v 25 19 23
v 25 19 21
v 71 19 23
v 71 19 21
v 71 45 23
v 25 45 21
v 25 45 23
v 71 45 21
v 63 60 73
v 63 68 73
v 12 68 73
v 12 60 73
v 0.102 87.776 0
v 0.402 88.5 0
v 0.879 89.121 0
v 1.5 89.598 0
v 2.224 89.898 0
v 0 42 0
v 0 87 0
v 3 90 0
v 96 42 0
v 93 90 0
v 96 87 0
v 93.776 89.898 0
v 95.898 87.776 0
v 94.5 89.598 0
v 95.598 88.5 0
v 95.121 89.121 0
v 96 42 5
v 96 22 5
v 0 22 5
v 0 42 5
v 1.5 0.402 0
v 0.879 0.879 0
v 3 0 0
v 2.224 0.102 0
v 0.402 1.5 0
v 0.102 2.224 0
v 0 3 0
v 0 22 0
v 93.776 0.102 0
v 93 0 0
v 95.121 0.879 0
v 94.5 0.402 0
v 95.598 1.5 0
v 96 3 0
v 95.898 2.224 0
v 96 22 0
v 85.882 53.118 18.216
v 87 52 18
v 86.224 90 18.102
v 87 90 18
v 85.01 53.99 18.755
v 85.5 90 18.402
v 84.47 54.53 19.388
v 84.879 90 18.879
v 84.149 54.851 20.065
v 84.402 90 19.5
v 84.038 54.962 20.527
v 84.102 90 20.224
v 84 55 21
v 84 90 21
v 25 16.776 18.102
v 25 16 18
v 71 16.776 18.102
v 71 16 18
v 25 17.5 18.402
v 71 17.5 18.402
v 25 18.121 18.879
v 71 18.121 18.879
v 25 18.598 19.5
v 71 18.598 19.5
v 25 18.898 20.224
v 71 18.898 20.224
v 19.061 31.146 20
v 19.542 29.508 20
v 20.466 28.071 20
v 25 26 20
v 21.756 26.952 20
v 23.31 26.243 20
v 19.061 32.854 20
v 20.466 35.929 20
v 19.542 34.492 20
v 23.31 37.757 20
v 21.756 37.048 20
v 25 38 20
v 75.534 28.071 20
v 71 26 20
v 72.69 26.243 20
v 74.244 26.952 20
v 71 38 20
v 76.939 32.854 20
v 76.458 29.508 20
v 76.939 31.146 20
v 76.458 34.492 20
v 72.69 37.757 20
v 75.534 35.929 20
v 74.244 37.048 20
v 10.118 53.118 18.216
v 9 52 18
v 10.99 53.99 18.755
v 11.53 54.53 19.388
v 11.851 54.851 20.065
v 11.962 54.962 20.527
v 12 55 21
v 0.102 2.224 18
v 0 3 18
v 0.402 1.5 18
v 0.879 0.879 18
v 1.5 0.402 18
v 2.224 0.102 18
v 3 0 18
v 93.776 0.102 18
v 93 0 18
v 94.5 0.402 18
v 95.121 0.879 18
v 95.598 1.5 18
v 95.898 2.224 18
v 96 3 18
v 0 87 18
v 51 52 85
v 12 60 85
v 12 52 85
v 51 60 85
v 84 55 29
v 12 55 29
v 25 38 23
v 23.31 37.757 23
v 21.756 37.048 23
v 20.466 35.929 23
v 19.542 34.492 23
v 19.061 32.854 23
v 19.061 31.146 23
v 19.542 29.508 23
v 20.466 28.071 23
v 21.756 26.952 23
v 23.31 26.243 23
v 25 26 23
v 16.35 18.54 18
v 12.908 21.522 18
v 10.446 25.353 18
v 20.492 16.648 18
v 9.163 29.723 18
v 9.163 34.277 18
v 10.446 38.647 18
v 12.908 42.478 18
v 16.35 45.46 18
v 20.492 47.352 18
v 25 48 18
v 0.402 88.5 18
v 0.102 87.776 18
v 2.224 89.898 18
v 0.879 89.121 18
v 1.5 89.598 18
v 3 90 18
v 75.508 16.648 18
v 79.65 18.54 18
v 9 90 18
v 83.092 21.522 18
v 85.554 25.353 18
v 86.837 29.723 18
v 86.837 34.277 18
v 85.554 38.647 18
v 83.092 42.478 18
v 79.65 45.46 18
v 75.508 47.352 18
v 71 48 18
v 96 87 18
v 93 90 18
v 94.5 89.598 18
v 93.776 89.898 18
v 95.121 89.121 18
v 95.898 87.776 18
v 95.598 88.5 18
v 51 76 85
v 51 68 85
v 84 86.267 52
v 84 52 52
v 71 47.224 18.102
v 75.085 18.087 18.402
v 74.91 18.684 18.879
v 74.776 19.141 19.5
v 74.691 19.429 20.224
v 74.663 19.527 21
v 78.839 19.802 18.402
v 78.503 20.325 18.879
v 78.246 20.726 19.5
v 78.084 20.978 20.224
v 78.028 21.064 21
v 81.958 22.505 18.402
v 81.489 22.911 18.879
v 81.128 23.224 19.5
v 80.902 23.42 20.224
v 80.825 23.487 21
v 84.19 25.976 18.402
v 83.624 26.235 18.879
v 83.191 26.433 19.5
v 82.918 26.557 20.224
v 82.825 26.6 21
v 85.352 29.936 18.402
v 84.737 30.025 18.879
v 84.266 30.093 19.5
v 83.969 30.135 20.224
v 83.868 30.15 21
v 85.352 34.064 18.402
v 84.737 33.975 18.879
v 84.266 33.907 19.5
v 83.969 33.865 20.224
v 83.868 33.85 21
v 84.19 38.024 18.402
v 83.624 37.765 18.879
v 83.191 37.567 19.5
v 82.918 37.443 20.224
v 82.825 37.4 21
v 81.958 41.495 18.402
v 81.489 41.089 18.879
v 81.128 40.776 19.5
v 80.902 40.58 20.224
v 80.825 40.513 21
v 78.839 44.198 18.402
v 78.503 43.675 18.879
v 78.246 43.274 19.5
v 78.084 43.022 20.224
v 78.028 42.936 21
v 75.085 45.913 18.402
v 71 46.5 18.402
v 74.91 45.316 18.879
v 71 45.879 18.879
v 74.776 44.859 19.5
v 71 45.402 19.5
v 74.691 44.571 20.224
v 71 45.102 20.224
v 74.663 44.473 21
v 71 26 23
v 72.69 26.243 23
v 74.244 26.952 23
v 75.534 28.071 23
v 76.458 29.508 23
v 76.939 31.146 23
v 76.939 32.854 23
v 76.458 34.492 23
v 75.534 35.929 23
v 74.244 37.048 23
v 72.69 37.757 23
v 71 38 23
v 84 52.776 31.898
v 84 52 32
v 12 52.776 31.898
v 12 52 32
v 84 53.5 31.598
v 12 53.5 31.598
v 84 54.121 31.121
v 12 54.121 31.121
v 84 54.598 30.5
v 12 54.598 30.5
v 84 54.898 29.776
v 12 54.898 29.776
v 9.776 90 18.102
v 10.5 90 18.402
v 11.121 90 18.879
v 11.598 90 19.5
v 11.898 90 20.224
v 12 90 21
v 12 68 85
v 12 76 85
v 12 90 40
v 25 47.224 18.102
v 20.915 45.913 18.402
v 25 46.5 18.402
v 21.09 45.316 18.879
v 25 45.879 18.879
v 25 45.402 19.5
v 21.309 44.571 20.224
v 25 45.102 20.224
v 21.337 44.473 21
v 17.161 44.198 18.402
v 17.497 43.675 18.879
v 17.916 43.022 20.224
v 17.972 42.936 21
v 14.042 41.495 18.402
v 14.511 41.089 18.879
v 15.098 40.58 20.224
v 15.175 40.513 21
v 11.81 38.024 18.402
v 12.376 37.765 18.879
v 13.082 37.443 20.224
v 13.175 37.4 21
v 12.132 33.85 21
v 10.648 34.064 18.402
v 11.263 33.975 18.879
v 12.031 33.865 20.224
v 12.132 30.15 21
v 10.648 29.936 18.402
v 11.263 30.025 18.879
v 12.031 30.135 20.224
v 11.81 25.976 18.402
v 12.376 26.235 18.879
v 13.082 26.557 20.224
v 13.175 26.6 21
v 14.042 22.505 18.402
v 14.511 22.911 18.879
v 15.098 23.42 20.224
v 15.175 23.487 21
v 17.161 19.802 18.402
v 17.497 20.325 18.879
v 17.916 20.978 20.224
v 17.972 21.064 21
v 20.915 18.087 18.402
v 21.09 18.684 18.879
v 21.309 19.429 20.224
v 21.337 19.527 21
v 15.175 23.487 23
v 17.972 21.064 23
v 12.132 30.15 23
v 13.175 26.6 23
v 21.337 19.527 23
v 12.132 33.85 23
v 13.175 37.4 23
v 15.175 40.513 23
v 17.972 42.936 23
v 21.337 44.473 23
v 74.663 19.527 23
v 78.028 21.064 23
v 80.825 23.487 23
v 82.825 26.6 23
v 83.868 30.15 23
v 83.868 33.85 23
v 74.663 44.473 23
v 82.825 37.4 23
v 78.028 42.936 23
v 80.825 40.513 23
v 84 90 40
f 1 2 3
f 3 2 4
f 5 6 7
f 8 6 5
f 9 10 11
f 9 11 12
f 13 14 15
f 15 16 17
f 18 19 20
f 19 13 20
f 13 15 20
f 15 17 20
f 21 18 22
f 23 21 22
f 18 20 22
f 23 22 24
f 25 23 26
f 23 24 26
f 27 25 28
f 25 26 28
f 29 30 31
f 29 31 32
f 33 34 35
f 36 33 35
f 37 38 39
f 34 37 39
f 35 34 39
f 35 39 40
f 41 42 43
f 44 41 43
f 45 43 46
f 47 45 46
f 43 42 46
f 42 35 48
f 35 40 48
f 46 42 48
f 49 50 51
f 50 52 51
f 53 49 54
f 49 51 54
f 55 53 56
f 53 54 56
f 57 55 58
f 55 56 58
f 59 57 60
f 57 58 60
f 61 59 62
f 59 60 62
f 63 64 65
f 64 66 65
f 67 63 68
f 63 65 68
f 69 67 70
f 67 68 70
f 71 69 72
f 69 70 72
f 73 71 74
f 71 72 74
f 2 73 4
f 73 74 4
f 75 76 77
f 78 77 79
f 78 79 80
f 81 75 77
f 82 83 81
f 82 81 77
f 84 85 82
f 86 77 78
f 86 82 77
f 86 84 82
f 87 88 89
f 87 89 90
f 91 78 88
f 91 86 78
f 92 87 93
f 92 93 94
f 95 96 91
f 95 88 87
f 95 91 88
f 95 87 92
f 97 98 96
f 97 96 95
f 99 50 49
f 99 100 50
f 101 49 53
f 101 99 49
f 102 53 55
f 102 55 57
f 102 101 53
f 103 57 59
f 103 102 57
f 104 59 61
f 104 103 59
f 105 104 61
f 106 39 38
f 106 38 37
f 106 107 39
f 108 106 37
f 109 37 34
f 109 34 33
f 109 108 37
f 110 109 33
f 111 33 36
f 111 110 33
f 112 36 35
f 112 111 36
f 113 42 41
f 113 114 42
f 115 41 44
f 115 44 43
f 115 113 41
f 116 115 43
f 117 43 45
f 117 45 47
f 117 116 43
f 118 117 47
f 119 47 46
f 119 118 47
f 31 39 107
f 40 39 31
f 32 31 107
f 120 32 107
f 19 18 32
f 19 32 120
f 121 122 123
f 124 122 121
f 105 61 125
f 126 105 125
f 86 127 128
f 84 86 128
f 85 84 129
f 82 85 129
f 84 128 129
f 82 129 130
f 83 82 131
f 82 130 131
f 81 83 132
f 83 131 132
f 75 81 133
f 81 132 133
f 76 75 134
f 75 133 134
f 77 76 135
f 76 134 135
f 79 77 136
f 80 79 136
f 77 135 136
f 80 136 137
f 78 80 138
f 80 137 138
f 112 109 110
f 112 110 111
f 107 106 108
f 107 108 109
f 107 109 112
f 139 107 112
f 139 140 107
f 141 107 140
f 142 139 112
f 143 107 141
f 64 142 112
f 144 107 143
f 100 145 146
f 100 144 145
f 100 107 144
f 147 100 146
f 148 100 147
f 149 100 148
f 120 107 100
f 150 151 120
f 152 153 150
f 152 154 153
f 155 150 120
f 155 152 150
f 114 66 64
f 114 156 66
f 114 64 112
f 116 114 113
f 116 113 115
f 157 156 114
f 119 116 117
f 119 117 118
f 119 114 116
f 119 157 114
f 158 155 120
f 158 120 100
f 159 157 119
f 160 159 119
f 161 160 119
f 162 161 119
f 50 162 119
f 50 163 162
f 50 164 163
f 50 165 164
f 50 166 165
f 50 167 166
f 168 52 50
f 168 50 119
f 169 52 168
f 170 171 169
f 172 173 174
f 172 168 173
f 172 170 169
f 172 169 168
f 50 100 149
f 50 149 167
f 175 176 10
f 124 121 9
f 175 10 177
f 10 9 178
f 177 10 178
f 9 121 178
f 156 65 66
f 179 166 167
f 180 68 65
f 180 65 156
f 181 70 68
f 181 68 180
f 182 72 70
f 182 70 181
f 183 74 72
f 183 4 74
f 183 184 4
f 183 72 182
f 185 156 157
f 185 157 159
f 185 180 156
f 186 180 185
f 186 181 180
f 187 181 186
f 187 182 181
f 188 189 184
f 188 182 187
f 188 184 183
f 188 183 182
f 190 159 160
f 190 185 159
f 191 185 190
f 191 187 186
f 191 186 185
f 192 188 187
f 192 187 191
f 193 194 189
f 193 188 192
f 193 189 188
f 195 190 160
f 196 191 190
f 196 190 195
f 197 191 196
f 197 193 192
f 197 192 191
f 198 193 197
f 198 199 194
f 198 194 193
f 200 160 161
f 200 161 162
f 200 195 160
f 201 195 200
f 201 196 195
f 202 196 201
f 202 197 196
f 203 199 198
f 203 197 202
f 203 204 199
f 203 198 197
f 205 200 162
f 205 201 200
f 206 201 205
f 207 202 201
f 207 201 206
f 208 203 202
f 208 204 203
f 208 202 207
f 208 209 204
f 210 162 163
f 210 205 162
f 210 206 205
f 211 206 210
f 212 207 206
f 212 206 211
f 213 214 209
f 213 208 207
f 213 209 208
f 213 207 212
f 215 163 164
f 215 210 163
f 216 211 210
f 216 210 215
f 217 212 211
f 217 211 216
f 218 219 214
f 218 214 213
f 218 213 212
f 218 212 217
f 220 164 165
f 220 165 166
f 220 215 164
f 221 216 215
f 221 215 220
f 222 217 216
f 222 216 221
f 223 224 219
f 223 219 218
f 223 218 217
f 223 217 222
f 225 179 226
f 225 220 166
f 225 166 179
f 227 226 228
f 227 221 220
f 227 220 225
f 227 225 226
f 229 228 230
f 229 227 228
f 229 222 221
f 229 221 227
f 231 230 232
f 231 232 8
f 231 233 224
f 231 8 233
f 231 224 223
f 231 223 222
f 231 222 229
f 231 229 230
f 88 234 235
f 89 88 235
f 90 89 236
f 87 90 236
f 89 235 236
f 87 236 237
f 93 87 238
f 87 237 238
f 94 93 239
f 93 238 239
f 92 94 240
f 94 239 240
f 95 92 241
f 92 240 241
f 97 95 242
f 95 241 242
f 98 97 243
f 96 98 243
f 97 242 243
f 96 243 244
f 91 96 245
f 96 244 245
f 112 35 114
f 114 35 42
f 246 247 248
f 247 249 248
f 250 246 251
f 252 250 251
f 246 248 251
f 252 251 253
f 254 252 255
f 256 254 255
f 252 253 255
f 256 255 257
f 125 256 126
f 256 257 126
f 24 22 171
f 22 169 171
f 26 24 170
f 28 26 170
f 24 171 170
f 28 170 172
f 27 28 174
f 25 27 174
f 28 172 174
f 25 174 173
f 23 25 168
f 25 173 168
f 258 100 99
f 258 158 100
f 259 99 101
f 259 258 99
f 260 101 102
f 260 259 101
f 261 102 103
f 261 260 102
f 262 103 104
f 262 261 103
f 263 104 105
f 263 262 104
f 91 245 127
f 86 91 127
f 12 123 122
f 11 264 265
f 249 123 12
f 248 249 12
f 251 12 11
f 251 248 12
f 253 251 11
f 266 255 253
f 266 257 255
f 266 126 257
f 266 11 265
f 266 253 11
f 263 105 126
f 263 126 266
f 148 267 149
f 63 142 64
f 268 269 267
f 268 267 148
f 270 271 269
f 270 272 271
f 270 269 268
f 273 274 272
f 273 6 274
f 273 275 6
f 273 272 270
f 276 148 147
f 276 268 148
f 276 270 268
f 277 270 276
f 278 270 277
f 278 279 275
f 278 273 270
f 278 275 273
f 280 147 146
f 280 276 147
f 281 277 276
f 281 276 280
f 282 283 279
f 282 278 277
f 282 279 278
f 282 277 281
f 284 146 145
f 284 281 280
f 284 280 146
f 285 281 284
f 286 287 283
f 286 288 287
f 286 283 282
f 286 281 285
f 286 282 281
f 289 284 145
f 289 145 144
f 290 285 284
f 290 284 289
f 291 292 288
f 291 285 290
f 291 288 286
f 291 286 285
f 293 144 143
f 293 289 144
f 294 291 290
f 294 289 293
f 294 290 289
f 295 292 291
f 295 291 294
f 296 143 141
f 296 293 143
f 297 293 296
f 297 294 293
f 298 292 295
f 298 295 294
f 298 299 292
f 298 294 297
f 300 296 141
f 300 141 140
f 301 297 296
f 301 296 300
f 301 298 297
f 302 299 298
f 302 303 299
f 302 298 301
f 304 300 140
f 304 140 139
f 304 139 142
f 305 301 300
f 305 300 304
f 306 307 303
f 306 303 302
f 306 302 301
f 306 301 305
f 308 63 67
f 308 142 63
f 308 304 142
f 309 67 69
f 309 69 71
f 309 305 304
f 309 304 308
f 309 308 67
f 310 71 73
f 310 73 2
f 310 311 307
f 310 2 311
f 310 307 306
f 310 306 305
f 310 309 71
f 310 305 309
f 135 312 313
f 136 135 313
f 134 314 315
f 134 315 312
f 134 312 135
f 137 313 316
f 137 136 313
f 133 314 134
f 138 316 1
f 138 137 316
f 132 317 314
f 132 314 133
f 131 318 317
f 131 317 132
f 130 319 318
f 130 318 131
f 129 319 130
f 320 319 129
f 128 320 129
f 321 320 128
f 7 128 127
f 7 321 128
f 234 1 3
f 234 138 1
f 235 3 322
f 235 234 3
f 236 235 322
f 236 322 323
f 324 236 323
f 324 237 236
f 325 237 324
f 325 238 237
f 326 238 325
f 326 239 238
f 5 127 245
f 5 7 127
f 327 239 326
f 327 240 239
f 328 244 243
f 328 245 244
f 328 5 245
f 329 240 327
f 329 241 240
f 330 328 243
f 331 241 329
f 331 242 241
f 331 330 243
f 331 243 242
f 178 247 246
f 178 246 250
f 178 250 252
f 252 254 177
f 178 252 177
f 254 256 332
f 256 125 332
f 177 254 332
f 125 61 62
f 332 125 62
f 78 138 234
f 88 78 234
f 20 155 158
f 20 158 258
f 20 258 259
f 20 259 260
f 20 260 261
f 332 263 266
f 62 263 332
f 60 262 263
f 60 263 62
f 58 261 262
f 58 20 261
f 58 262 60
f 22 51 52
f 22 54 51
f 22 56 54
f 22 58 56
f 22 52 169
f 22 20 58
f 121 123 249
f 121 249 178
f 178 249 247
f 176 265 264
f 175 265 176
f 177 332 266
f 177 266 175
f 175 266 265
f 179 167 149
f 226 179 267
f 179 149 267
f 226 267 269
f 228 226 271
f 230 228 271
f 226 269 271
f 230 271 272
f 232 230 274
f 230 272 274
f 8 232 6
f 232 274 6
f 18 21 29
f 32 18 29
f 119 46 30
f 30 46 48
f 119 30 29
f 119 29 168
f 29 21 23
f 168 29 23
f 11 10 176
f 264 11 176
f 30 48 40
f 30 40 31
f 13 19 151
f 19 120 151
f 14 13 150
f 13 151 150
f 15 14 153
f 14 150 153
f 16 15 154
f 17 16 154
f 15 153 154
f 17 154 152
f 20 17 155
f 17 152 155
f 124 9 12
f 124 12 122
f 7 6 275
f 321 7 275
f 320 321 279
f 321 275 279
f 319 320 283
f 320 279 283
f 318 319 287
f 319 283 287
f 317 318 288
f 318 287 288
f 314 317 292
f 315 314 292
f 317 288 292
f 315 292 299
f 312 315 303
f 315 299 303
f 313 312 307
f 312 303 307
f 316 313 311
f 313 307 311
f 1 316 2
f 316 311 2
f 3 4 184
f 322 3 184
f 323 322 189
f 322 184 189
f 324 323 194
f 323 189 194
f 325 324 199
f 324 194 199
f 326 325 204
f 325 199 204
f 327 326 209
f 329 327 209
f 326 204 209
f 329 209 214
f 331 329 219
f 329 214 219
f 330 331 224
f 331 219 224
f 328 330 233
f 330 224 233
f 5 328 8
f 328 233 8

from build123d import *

# Parameters (mm, degrees)
F0_W      = 96
F0_H      = 90
F1_DEPTH  = 18
F2_W      = 72
F2_H      = 38
F4_DEPTH  = 67
F6_DEPTH  = 38
F7_W      = 8
F7_H      = 12
F8_DEPTH  = 51.001
F10_DEPTH = 72.001
F11_W     = 20
F11_H     = 5
F12_DEPTH = 96
F14_W     = 46
F14_H     = 26
F15_DEPTH = 5
F17_DEPTH = 3
F18_W     = 3
F18_H     = 14
F19_DEPTH = 72
F20_R     = 2.99999


# Not quite as in the source:
# - a fillet or chamfer is up to 0.001 mm smaller than in the source, because OpenCascade refuses the exact size


with BuildPart() as f1:
    # F0 (on Top) → F1 (new body)
    with BuildSketch(Plane.XY):
        with Locations((48, 45)):
            Rectangle(F0_W, F0_H)
    extrude(amount=F1_DEPTH)

    # F2 (on face) → F4 (join, through all)
    with BuildSketch(Plane.XY.offset(18)):
        with Locations((48, 71)):
            Rectangle(F2_W, F2_H)
    extrude(amount=F4_DEPTH)

    # F5 (on face) → F6 (cut)
    with BuildSketch(Plane.XZ.offset(-52)):
        Polygon((84, 52), (84, 85), (51, 85), align=None)
    extrude(amount=-F6_DEPTH, mode=Mode.SUBTRACT)

    # F7 (on face) → F8 (cut, through all)
    with BuildSketch(Plane(origin=(12, 0, 0), x_dir=(0, -1, 0), z_dir=(-1, 0, 0))):
        with Locations((-64, 79)):
            Rectangle(F7_W, F7_H)
    extrude(amount=-F8_DEPTH, mode=Mode.SUBTRACT)

    # F9 (on face) → F10 (cut, through all)
    with BuildSketch(Plane(origin=(12, 0, 0), x_dir=(0, -1, 0), z_dir=(-1, 0, 0))):
        Polygon((-76, 85), (-90, 85), (-90, 40), align=None)
    extrude(amount=-F10_DEPTH, mode=Mode.SUBTRACT)

    # F11 (on face) → F12 (cut, through all)
    with BuildSketch(Plane.YZ.offset(96)):
        with Locations((32, 2.5)):
            Rectangle(F11_W, F11_H)
    extrude(amount=-F12_DEPTH, mode=Mode.SUBTRACT)

    # F14 (on face) → F15 (join)
    with BuildSketch(Plane.XY.offset(18)):
        with Locations((48, 32)):
            Rectangle(F14_W, F14_H)
        with BuildLine():
            Line((25, 19), (25, 45))
            ThreePointArc((25, 45), (12, 32), (25, 19))
        make_face()
        with BuildLine():
            ThreePointArc((71, 19), (84, 32), (71, 45))
            Line((71, 45), (71, 19))
        make_face()
    extrude(amount=F15_DEPTH)

    # F16 (on face) → F17 (cut)
    with BuildSketch(Plane.XY.offset(23)):
        with BuildLine():
            ThreePointArc((25, 38), (19, 32), (25, 26))
            Line((25, 26), (71, 26))
            ThreePointArc((71, 26), (77, 32), (71, 38))
            Line((71, 38), (25, 38))
        make_face()
    extrude(amount=-F17_DEPTH, mode=Mode.SUBTRACT)

    # F18 (on face) → F19 (cut, through all)
    with BuildSketch(Plane.YZ.offset(84)):
        with Locations((53.5, 25)):
            Rectangle(F18_W, F18_H)
    extrude(amount=-F19_DEPTH, mode=Mode.SUBTRACT)

    # F20 (radius 3 in the source; OpenCascade refuses exactly that, so slightly less here)
    f20_edges = [f1.edges().sort_by_distance(p)[0] for p in [
        (48, 19, 18),
        (48, 55, 18),
        (48, 55, 32),
        (0, 0, 9),
        (96, 0, 9),
        (96, 90, 9),
        (0, 90, 9),
        (84, 72.5, 18),
        (12, 72.5, 18),
    ]]
    fillet(f20_edges, radius=F20_R)


solid = f1.part
